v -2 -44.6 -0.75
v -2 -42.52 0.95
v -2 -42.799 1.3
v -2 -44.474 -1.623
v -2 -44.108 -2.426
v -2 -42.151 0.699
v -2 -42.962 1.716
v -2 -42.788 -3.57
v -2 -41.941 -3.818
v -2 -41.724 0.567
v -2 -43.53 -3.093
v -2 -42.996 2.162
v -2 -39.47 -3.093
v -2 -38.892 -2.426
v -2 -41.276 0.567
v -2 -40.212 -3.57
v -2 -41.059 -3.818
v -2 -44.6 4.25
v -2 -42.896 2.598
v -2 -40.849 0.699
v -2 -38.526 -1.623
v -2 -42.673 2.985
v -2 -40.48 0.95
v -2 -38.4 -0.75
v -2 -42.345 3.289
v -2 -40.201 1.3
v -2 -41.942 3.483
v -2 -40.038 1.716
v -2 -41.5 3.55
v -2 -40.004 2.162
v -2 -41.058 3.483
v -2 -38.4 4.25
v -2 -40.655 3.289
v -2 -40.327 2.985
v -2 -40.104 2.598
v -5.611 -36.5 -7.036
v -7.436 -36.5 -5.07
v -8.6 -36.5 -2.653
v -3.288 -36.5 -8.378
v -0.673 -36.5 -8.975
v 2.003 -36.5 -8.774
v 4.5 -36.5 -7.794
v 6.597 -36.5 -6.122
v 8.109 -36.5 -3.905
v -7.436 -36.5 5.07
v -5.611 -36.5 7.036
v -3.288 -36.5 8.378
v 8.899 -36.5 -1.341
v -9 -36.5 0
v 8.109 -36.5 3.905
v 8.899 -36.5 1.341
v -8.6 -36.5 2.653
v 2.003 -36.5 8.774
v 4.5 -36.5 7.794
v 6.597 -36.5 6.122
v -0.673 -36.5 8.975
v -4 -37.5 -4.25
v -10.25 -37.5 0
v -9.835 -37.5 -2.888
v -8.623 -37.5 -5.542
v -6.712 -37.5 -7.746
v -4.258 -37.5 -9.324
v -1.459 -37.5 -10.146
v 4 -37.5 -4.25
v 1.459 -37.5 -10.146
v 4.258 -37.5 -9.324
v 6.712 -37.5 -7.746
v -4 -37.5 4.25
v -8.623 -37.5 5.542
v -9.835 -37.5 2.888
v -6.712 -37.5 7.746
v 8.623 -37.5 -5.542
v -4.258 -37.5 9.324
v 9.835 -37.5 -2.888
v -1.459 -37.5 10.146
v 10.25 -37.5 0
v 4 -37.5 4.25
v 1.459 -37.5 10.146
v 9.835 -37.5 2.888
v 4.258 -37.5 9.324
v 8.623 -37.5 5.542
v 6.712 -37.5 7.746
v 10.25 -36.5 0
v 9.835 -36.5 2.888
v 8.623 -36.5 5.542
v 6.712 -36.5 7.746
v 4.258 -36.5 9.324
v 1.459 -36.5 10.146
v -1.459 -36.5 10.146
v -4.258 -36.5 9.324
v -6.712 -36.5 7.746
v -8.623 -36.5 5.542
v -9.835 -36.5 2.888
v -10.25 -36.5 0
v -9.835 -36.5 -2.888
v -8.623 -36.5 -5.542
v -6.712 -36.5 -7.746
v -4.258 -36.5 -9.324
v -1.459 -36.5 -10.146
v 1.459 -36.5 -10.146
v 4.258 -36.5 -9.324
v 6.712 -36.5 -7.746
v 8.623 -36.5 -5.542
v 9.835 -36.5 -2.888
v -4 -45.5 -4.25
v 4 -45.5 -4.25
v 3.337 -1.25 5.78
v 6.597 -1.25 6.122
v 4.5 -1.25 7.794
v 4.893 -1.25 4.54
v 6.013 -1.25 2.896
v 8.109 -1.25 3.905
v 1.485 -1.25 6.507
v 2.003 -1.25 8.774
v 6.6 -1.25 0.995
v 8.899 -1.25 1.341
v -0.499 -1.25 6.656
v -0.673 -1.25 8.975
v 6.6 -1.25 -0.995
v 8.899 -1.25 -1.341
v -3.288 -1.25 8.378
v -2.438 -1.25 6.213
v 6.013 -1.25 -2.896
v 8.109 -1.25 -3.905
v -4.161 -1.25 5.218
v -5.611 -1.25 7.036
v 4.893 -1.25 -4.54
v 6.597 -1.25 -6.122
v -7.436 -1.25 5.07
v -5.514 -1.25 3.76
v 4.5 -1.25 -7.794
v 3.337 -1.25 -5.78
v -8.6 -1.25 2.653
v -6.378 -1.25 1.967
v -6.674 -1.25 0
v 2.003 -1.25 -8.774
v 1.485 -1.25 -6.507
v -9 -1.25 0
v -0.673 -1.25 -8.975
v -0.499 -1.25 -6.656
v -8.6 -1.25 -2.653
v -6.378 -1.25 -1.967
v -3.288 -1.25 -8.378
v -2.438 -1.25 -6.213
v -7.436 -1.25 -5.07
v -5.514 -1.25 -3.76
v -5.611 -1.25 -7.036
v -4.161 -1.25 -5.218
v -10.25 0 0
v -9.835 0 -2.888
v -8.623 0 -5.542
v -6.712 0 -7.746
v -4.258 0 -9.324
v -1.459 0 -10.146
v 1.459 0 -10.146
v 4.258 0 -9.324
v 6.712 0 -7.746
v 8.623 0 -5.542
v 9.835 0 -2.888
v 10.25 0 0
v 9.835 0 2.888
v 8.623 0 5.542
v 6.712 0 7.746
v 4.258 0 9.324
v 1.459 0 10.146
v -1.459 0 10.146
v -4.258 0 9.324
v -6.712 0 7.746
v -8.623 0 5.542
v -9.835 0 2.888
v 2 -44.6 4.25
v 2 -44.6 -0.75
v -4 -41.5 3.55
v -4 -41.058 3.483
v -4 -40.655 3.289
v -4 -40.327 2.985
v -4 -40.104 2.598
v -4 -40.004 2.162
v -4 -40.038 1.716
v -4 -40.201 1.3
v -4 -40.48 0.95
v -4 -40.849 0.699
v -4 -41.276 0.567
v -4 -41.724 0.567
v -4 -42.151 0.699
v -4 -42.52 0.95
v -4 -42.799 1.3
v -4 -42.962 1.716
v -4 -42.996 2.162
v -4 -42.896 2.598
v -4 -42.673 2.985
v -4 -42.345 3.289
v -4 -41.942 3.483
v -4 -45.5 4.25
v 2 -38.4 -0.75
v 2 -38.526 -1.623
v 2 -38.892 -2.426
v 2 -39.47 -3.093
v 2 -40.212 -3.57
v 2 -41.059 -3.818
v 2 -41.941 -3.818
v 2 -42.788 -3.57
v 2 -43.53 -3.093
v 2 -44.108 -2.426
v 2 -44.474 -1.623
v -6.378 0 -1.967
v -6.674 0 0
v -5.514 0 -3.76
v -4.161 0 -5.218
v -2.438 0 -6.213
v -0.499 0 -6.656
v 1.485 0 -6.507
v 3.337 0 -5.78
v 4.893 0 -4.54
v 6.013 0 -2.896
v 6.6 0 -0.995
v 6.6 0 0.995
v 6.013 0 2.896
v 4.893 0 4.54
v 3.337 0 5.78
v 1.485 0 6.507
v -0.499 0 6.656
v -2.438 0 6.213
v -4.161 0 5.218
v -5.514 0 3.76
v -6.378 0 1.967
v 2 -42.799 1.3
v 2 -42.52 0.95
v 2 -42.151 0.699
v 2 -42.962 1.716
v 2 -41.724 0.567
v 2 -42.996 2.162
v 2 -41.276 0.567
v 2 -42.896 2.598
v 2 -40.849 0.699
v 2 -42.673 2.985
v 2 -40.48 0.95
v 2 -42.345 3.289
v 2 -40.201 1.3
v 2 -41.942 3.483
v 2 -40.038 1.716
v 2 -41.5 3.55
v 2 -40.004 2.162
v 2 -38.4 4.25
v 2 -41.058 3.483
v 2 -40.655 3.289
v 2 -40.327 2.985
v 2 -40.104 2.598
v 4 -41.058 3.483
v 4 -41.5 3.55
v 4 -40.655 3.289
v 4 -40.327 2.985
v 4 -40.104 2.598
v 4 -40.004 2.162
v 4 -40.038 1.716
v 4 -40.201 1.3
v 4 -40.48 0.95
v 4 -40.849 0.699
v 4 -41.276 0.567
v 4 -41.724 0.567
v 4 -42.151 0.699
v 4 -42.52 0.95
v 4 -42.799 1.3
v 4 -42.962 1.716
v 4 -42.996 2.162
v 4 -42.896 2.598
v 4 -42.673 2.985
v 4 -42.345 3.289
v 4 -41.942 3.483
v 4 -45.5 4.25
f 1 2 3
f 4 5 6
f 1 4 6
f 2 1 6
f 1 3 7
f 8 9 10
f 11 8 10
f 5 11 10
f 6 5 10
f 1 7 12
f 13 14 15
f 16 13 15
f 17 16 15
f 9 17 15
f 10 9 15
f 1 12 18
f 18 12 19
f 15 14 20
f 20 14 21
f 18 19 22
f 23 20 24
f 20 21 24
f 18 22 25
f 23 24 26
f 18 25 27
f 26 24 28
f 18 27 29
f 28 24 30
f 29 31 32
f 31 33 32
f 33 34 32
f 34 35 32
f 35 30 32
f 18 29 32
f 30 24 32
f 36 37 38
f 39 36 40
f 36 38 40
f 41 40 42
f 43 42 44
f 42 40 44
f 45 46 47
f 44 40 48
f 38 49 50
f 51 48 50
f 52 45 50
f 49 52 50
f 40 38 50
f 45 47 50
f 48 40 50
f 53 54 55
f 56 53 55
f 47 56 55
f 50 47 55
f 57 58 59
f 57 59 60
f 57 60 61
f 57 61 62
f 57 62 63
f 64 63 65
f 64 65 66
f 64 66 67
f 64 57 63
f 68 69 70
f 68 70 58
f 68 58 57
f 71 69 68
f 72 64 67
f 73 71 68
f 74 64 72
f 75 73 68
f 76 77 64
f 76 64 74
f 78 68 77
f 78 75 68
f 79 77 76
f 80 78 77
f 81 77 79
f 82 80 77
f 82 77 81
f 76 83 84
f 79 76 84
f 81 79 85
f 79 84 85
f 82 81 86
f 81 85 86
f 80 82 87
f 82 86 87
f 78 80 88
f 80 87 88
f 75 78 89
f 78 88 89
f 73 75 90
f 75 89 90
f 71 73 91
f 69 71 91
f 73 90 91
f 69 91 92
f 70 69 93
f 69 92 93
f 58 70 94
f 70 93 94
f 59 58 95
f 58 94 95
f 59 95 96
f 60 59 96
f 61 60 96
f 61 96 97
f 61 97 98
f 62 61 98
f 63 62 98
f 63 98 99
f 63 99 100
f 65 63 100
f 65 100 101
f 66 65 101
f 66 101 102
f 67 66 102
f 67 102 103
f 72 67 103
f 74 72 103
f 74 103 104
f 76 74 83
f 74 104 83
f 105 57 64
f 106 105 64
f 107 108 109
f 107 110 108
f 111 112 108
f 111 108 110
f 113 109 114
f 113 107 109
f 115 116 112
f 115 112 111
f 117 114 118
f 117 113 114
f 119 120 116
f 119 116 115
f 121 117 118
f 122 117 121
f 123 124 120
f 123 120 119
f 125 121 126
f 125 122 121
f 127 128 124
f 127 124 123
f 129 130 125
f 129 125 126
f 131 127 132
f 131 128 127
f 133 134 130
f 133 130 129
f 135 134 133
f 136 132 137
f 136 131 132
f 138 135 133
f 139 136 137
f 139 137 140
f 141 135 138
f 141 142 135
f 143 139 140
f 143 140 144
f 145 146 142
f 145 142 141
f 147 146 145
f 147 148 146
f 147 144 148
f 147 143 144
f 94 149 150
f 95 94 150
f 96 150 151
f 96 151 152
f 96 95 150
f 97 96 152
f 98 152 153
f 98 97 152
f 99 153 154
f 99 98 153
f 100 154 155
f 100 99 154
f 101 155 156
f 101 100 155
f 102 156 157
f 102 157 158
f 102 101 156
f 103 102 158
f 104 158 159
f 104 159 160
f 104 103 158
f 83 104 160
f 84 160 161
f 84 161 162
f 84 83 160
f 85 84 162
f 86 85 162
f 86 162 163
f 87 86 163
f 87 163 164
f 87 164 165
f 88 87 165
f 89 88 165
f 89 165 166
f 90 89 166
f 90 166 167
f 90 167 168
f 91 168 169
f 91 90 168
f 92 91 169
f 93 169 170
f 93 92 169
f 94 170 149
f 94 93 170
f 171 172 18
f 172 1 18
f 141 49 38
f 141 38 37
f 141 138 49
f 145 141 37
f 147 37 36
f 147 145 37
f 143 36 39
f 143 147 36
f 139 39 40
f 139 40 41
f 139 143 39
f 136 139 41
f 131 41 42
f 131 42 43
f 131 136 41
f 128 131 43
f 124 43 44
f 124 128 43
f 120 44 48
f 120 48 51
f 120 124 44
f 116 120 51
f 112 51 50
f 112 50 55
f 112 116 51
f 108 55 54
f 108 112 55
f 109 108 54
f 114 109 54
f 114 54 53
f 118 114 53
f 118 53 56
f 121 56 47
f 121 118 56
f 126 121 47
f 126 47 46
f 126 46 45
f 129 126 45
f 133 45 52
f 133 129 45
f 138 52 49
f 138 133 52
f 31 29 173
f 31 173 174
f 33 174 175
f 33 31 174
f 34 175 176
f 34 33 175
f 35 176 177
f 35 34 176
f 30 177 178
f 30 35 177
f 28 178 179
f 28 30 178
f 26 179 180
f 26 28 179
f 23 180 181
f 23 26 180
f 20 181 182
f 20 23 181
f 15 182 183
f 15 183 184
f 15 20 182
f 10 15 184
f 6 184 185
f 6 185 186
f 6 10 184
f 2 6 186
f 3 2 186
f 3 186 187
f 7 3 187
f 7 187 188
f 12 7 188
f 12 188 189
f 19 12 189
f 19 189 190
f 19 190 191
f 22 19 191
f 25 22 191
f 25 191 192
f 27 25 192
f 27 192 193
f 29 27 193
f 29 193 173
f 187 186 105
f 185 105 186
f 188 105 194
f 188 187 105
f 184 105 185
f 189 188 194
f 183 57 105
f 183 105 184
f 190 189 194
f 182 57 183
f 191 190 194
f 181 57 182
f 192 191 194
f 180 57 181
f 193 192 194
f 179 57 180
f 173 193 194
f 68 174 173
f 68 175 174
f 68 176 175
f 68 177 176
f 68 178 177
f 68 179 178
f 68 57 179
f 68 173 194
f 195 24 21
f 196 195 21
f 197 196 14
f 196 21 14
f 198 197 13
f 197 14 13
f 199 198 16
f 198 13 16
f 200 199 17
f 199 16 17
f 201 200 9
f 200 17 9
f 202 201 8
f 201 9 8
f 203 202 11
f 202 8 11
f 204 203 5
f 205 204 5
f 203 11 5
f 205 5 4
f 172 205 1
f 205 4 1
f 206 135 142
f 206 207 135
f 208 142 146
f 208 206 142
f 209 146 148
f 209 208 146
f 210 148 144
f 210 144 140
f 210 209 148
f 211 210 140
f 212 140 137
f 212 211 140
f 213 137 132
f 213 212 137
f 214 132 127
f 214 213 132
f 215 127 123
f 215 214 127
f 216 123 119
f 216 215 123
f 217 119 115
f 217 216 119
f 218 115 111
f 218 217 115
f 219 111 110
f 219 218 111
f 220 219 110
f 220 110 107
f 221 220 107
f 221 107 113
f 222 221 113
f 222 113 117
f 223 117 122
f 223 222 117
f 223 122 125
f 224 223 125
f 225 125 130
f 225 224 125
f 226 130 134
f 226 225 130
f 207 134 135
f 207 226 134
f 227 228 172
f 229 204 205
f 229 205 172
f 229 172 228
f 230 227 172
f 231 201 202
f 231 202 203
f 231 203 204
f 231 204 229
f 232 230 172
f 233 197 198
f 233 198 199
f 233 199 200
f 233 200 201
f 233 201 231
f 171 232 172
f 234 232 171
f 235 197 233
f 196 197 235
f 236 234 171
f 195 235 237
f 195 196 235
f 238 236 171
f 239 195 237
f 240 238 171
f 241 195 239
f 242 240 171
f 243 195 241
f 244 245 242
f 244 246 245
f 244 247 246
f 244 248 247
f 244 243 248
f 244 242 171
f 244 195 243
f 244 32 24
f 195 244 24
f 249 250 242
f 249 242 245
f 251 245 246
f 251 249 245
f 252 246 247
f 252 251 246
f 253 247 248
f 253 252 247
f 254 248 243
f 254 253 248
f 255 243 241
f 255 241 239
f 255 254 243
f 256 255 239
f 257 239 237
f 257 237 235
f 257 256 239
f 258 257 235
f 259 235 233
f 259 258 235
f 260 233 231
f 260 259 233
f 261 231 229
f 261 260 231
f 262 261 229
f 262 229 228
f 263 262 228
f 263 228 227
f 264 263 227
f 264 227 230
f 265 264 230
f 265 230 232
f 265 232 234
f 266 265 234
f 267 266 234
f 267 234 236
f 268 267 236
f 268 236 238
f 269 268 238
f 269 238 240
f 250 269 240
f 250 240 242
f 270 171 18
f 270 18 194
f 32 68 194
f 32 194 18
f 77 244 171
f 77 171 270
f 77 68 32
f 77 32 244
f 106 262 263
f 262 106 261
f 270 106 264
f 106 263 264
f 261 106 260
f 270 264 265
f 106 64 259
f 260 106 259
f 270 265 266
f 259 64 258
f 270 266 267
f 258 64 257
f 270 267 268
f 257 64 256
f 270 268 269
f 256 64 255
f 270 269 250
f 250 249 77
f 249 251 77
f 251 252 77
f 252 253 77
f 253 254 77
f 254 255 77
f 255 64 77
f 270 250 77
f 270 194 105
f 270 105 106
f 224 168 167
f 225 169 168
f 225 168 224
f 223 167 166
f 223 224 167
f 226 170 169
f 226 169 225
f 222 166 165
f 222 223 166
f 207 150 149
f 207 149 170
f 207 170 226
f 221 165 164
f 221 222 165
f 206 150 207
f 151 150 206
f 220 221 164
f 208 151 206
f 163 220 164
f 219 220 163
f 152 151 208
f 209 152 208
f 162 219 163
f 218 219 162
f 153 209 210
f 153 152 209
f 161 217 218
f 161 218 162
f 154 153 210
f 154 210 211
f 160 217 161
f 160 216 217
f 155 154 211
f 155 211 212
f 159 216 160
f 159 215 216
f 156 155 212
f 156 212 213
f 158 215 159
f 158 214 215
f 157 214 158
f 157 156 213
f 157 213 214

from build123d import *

# Parameters (mm, degrees)
SKETCH2_R           = 10.25
BOSS_EXTRUDE1_DEPTH = 1
SKETCH3_W           = 8
SKETCH3_H           = 8.5
BOSS_EXTRUDE2_DEPTH = 8
CUT_EXTRUDE1_START  = 4
SKETCH4_R           = 1.5
CUT_EXTRUDE1_DEPTH  = 2
SKETCH4_3_R         = 1.5
CUT_EXTRUDE3_DEPTH  = 8


with BuildPart() as part:
    # Sketch1 → Revolve1 (revolve)
    with BuildSketch(Plane.XY):
        Polygon((-6.674207745, -1.25), (-6.674207745, 0), (-10.25, 0), (-10.25, -36.5), (-9, -36.5), (-9, -1.25), align=None)
    revolve(axis=Axis((0, 9.278019649, 0), (0, -1, 0)))

    # Sketch2 → Boss-Extrude1 (add)
    with BuildSketch(Plane.XZ.offset(36.5)):
        Circle(SKETCH2_R)
    extrude(amount=BOSS_EXTRUDE1_DEPTH)

    # Sketch3 → Boss-Extrude2 (add)
    with BuildSketch(Plane.XZ.offset(37.5)):
        Rectangle(SKETCH3_W, SKETCH3_H)
    extrude(amount=BOSS_EXTRUDE2_DEPTH)

    # Sketch4 → Cut-Extrude1 (cut, symmetric)
    with BuildSketch(Plane(origin=(4, 0, -0.2768318), x_dir=(0, 0, 1), z_dir=(-1, 0, 0)).offset(CUT_EXTRUDE1_START)):
        with BuildLine():
            Line((4.5268318, -44.6), (4.5268318, -38.4))
            Line((4.5268318, -38.4), (-0.4731682, -38.4))
            ThreePointArc((-0.4731682, -38.4), (-3.5731682, -41.5), (-0.4731682, -44.6))
            Line((-0.4731682, -44.6), (4.5268318, -44.6))
        make_face()
        with Locations((2.3268318, -41.5)):
            Circle(SKETCH4_R, mode=Mode.SUBTRACT)
    extrude(amount=CUT_EXTRUDE1_DEPTH, both=True, mode=Mode.SUBTRACT)

    # Sketch4<3> → Cut-Extrude3 (cut)
    with BuildSketch(Plane(origin=(4, 0, -0.2768318), x_dir=(0, 0, 1), z_dir=(-1, 0, 0))):
        with Locations((2.3268318, -41.5)):
            Circle(SKETCH4_3_R)
    extrude(amount=CUT_EXTRUDE3_DEPTH, mode=Mode.SUBTRACT)


solid = part.part
